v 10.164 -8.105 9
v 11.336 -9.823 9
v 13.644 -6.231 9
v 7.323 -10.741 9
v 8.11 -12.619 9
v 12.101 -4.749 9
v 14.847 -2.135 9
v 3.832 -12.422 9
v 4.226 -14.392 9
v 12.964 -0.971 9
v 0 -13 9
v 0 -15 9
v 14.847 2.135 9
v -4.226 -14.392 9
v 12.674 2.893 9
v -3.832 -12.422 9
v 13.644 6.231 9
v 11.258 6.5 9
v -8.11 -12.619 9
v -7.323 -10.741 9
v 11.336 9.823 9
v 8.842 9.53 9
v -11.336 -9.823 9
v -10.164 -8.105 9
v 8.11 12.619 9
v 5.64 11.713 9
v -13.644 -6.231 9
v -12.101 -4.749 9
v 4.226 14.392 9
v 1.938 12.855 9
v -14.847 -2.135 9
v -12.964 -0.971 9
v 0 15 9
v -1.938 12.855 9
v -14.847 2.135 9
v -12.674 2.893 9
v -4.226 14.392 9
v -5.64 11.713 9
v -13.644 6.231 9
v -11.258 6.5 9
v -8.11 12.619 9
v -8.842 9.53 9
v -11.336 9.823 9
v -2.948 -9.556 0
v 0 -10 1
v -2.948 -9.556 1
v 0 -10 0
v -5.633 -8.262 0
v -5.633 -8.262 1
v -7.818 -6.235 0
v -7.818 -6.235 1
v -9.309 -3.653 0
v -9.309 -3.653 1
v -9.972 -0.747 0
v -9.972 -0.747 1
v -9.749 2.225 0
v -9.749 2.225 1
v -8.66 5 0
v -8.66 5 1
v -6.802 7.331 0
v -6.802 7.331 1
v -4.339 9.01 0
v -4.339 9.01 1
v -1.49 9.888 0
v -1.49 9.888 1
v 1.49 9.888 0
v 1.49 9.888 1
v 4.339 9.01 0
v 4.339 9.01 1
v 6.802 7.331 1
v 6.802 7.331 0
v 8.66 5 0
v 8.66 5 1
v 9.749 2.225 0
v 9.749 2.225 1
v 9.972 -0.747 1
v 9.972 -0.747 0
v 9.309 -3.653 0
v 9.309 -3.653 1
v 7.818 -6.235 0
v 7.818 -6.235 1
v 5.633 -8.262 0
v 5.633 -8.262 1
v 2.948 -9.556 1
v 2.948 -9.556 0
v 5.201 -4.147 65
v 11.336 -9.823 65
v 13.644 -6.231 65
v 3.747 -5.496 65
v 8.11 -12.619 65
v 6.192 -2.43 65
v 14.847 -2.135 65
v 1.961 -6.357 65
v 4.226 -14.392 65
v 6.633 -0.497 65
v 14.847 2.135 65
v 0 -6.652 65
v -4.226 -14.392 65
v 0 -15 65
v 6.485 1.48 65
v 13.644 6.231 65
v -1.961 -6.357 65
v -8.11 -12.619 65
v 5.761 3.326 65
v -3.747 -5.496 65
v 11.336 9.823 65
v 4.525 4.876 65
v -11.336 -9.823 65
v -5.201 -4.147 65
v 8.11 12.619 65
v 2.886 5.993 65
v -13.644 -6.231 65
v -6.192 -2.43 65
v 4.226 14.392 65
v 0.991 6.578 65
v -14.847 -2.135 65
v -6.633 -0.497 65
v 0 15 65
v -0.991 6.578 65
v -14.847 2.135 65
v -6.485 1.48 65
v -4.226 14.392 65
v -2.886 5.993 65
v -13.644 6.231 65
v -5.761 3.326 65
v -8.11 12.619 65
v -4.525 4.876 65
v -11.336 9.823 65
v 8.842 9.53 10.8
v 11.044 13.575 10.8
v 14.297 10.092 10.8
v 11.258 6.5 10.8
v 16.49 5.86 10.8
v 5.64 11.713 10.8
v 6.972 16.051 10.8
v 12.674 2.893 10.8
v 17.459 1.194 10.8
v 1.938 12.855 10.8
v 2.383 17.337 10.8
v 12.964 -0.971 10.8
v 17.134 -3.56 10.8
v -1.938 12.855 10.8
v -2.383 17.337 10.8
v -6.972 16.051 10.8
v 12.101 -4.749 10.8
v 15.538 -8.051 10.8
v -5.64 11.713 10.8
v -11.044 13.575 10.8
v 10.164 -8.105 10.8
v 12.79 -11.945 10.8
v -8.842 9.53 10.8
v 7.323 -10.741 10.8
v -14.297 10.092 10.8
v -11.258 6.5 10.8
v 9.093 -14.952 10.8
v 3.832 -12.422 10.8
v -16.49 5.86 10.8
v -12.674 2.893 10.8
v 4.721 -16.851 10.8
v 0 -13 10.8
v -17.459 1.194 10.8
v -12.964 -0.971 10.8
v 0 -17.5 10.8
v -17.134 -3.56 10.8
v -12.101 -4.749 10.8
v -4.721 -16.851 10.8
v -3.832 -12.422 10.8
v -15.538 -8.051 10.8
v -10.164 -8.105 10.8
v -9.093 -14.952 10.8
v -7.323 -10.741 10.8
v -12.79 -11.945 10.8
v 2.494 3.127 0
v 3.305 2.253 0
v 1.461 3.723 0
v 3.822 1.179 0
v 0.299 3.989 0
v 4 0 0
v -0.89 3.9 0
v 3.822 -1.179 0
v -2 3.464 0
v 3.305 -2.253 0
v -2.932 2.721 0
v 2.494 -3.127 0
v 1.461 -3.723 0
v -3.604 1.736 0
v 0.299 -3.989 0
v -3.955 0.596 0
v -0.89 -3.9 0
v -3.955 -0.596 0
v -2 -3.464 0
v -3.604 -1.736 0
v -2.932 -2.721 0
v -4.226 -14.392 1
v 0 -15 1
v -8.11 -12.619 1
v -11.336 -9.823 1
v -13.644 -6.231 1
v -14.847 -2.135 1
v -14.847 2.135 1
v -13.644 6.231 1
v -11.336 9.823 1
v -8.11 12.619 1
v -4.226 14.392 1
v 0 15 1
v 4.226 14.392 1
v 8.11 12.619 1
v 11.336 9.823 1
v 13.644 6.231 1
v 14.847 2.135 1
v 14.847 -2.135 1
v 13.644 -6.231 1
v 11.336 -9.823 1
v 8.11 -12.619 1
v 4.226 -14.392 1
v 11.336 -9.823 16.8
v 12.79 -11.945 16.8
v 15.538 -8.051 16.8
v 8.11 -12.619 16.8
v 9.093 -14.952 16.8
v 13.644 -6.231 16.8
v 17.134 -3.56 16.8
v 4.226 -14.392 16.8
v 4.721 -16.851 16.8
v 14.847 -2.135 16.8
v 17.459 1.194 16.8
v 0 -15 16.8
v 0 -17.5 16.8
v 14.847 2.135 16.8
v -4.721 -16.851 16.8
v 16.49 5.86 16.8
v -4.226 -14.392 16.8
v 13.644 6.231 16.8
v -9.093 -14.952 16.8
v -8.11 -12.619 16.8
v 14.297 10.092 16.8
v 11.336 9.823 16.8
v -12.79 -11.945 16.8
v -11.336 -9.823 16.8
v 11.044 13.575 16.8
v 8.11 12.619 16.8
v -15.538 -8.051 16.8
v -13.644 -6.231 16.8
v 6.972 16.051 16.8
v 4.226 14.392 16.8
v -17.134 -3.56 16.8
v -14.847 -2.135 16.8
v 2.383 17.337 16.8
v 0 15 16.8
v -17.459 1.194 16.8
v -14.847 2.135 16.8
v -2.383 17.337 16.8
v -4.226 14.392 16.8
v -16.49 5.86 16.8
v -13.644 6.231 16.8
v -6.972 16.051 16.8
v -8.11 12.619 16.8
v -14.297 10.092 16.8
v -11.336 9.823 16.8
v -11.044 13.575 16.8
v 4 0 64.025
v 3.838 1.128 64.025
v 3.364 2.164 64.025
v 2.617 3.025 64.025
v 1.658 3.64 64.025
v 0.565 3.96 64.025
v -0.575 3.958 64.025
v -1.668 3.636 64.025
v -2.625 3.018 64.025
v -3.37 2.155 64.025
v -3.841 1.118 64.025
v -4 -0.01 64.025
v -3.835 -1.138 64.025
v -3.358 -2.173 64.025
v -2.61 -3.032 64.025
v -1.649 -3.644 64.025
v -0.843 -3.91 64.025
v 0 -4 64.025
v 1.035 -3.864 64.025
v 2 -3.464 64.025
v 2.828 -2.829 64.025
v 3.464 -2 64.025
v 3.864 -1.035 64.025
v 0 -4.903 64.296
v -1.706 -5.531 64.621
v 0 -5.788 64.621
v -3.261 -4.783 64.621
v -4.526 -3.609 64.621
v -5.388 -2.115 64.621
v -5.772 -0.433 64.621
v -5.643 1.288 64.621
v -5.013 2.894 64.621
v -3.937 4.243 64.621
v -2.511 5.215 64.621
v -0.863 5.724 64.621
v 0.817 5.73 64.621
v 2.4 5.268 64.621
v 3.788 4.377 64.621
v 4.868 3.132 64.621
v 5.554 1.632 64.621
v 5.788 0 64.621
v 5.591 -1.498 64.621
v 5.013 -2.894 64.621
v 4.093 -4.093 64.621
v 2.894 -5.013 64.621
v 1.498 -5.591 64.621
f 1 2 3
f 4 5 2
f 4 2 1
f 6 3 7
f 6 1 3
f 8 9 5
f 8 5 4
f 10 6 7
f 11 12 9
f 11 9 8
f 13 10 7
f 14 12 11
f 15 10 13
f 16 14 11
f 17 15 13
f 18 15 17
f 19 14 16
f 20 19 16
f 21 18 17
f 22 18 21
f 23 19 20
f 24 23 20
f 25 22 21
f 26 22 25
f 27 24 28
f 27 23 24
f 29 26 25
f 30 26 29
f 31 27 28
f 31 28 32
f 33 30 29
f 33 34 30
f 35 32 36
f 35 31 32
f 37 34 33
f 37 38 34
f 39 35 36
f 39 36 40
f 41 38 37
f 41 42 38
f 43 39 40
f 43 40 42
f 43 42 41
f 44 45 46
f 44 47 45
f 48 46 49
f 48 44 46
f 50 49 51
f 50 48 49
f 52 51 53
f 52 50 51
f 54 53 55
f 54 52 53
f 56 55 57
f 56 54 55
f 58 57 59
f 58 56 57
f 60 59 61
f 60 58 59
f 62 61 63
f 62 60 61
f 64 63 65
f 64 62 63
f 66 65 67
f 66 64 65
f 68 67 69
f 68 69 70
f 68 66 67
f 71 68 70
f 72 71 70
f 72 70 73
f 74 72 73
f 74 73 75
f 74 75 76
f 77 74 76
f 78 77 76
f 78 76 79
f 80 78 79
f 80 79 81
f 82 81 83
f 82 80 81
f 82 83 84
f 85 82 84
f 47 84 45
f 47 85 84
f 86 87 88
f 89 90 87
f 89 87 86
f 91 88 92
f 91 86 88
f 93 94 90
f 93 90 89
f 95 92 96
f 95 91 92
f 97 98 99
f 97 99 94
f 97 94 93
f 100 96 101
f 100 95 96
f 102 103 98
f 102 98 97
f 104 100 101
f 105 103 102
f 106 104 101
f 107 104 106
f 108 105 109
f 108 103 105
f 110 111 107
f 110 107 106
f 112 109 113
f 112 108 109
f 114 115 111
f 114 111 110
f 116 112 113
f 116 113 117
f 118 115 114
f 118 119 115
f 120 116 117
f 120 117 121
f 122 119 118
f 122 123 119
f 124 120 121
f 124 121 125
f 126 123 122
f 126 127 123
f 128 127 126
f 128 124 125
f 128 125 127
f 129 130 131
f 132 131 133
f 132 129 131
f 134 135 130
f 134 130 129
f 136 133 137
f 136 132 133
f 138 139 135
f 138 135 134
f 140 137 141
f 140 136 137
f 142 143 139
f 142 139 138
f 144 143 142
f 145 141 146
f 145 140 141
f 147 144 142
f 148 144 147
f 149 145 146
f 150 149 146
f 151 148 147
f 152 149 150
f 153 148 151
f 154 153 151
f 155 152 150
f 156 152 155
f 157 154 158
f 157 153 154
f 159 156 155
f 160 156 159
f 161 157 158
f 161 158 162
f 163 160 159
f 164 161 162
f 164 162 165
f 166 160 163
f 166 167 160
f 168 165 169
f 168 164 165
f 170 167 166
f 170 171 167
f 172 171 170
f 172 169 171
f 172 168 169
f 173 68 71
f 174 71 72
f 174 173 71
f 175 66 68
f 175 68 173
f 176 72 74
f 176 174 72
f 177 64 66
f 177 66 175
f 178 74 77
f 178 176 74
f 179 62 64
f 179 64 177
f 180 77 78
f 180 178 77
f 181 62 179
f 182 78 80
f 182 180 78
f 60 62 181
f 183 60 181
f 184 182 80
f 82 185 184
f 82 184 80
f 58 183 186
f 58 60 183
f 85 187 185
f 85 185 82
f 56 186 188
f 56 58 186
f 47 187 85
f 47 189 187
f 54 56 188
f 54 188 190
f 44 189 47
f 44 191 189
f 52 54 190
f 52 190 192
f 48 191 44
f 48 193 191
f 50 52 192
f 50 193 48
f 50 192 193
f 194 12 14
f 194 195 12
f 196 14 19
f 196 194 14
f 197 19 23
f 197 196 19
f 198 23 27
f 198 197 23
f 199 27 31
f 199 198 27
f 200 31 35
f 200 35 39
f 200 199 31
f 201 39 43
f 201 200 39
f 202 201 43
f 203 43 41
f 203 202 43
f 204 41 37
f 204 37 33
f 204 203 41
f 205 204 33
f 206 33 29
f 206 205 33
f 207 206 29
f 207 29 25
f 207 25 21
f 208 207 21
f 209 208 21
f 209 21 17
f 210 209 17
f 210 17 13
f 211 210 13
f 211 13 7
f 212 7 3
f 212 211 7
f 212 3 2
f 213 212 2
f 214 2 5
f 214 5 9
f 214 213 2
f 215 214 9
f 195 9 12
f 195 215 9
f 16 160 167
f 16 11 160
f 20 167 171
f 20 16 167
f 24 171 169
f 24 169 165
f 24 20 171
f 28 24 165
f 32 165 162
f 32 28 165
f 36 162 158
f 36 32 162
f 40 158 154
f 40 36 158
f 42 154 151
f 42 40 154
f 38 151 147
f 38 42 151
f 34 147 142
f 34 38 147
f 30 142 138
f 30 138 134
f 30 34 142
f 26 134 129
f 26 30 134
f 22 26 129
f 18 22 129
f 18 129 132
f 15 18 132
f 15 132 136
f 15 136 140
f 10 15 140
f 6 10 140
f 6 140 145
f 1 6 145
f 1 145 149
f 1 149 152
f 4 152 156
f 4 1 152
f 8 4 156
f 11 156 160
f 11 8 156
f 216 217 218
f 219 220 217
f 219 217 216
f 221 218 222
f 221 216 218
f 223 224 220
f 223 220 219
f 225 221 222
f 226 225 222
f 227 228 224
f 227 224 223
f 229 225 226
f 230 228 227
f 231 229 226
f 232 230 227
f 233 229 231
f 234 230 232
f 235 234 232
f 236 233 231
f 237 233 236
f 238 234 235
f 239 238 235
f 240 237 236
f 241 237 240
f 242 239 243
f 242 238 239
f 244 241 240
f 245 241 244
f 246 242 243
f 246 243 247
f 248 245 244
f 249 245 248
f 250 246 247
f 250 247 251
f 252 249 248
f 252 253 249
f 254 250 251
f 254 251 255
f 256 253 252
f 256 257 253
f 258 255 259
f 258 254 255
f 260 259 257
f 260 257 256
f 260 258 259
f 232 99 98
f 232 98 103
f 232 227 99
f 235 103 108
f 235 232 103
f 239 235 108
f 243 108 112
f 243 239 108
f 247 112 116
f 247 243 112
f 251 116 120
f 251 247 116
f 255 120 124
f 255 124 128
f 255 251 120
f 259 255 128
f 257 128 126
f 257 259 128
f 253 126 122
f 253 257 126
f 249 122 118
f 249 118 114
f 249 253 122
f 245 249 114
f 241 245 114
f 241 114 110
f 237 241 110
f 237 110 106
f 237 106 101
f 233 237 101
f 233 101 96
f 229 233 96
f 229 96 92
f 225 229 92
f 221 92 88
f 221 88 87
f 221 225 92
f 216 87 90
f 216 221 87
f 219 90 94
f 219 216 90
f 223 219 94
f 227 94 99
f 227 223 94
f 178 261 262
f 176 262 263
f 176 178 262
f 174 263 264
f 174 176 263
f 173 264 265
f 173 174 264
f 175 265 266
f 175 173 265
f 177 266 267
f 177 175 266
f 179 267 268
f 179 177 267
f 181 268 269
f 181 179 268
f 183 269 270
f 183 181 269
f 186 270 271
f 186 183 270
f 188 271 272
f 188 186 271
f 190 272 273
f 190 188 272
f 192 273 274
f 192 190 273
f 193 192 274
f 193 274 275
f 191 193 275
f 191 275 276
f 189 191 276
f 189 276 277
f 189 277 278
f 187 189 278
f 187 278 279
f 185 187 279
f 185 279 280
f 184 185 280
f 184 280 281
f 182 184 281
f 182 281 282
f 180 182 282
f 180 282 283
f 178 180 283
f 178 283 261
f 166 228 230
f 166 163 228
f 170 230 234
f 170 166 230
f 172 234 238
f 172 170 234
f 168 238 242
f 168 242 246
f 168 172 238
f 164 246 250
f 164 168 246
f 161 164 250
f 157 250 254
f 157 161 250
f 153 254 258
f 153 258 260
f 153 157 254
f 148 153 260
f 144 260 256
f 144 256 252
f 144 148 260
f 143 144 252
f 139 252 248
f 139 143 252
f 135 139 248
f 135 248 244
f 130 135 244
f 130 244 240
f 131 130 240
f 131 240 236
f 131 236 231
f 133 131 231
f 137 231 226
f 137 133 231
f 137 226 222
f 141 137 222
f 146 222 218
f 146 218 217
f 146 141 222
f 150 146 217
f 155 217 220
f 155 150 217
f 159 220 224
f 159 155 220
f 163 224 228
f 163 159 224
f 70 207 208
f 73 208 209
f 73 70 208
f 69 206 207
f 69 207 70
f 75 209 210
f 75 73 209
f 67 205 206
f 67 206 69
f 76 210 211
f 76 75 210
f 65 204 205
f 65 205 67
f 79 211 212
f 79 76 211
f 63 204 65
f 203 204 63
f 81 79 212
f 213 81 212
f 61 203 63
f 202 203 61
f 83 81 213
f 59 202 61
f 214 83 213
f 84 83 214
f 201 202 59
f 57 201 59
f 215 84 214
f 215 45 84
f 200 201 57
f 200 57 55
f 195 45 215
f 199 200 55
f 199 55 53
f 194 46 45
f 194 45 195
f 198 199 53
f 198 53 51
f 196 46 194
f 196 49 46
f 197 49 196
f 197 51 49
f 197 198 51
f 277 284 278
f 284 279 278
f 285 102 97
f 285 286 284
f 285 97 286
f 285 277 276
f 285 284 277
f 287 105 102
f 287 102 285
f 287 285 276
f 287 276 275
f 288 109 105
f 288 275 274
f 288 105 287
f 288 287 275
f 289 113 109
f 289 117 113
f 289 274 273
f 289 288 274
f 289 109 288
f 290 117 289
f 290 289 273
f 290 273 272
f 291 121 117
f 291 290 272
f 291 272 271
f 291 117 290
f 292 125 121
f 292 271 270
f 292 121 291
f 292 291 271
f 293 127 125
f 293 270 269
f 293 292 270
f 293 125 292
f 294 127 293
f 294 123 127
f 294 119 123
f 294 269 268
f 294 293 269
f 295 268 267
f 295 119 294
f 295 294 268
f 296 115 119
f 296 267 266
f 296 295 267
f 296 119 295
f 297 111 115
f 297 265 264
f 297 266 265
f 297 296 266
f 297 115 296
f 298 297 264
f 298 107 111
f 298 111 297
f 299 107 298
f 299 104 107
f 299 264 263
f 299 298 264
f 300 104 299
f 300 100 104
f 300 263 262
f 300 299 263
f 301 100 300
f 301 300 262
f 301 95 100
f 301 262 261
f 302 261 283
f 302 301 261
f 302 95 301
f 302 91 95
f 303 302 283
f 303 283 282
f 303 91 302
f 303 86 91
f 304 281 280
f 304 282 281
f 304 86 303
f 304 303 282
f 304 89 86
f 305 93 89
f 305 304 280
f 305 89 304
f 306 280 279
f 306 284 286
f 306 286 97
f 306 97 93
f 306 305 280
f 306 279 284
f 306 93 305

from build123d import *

# Parameters (mm, degrees)
F2_R     = 4
F3_DEPTH = 70


with BuildPart() as f1:
    # F0 (on Right) → F1 (revolve)
    with BuildSketch(Plane.YZ):
        with BuildLine():
            Line((-10, 0), (0, 0))
            Line((0, 0), (0, 63.5))
            ThreePointArc((0, 63.5), (-3.409545, 63.879649), (-6.652067, 65))
            Line((-6.652067, 65), (-15, 65))
            Line((-15, 65), (-15, 16.8))
            Line((-15, 16.8), (-17.5, 16.8))
            Line((-17.5, 16.8), (-17.5, 10.8))
            Line((-17.5, 10.8), (-13, 10.8))
            Line((-13, 10.8), (-13, 9))
            Line((-13, 9), (-15, 9))
            Line((-15, 9), (-15, 1))
            Line((-15, 1), (-10, 1))
            Line((-10, 1), (-10, 0))
        make_face()
    revolve(axis=Axis((0, 0, 22.3796), (0, 0, -1)))

    # F2 (on Top) → F3 (cut)
    with BuildSketch(Plane.XY):
        Circle(F2_R)
    extrude(amount=F3_DEPTH, mode=Mode.SUBTRACT)


solid = f1.part
